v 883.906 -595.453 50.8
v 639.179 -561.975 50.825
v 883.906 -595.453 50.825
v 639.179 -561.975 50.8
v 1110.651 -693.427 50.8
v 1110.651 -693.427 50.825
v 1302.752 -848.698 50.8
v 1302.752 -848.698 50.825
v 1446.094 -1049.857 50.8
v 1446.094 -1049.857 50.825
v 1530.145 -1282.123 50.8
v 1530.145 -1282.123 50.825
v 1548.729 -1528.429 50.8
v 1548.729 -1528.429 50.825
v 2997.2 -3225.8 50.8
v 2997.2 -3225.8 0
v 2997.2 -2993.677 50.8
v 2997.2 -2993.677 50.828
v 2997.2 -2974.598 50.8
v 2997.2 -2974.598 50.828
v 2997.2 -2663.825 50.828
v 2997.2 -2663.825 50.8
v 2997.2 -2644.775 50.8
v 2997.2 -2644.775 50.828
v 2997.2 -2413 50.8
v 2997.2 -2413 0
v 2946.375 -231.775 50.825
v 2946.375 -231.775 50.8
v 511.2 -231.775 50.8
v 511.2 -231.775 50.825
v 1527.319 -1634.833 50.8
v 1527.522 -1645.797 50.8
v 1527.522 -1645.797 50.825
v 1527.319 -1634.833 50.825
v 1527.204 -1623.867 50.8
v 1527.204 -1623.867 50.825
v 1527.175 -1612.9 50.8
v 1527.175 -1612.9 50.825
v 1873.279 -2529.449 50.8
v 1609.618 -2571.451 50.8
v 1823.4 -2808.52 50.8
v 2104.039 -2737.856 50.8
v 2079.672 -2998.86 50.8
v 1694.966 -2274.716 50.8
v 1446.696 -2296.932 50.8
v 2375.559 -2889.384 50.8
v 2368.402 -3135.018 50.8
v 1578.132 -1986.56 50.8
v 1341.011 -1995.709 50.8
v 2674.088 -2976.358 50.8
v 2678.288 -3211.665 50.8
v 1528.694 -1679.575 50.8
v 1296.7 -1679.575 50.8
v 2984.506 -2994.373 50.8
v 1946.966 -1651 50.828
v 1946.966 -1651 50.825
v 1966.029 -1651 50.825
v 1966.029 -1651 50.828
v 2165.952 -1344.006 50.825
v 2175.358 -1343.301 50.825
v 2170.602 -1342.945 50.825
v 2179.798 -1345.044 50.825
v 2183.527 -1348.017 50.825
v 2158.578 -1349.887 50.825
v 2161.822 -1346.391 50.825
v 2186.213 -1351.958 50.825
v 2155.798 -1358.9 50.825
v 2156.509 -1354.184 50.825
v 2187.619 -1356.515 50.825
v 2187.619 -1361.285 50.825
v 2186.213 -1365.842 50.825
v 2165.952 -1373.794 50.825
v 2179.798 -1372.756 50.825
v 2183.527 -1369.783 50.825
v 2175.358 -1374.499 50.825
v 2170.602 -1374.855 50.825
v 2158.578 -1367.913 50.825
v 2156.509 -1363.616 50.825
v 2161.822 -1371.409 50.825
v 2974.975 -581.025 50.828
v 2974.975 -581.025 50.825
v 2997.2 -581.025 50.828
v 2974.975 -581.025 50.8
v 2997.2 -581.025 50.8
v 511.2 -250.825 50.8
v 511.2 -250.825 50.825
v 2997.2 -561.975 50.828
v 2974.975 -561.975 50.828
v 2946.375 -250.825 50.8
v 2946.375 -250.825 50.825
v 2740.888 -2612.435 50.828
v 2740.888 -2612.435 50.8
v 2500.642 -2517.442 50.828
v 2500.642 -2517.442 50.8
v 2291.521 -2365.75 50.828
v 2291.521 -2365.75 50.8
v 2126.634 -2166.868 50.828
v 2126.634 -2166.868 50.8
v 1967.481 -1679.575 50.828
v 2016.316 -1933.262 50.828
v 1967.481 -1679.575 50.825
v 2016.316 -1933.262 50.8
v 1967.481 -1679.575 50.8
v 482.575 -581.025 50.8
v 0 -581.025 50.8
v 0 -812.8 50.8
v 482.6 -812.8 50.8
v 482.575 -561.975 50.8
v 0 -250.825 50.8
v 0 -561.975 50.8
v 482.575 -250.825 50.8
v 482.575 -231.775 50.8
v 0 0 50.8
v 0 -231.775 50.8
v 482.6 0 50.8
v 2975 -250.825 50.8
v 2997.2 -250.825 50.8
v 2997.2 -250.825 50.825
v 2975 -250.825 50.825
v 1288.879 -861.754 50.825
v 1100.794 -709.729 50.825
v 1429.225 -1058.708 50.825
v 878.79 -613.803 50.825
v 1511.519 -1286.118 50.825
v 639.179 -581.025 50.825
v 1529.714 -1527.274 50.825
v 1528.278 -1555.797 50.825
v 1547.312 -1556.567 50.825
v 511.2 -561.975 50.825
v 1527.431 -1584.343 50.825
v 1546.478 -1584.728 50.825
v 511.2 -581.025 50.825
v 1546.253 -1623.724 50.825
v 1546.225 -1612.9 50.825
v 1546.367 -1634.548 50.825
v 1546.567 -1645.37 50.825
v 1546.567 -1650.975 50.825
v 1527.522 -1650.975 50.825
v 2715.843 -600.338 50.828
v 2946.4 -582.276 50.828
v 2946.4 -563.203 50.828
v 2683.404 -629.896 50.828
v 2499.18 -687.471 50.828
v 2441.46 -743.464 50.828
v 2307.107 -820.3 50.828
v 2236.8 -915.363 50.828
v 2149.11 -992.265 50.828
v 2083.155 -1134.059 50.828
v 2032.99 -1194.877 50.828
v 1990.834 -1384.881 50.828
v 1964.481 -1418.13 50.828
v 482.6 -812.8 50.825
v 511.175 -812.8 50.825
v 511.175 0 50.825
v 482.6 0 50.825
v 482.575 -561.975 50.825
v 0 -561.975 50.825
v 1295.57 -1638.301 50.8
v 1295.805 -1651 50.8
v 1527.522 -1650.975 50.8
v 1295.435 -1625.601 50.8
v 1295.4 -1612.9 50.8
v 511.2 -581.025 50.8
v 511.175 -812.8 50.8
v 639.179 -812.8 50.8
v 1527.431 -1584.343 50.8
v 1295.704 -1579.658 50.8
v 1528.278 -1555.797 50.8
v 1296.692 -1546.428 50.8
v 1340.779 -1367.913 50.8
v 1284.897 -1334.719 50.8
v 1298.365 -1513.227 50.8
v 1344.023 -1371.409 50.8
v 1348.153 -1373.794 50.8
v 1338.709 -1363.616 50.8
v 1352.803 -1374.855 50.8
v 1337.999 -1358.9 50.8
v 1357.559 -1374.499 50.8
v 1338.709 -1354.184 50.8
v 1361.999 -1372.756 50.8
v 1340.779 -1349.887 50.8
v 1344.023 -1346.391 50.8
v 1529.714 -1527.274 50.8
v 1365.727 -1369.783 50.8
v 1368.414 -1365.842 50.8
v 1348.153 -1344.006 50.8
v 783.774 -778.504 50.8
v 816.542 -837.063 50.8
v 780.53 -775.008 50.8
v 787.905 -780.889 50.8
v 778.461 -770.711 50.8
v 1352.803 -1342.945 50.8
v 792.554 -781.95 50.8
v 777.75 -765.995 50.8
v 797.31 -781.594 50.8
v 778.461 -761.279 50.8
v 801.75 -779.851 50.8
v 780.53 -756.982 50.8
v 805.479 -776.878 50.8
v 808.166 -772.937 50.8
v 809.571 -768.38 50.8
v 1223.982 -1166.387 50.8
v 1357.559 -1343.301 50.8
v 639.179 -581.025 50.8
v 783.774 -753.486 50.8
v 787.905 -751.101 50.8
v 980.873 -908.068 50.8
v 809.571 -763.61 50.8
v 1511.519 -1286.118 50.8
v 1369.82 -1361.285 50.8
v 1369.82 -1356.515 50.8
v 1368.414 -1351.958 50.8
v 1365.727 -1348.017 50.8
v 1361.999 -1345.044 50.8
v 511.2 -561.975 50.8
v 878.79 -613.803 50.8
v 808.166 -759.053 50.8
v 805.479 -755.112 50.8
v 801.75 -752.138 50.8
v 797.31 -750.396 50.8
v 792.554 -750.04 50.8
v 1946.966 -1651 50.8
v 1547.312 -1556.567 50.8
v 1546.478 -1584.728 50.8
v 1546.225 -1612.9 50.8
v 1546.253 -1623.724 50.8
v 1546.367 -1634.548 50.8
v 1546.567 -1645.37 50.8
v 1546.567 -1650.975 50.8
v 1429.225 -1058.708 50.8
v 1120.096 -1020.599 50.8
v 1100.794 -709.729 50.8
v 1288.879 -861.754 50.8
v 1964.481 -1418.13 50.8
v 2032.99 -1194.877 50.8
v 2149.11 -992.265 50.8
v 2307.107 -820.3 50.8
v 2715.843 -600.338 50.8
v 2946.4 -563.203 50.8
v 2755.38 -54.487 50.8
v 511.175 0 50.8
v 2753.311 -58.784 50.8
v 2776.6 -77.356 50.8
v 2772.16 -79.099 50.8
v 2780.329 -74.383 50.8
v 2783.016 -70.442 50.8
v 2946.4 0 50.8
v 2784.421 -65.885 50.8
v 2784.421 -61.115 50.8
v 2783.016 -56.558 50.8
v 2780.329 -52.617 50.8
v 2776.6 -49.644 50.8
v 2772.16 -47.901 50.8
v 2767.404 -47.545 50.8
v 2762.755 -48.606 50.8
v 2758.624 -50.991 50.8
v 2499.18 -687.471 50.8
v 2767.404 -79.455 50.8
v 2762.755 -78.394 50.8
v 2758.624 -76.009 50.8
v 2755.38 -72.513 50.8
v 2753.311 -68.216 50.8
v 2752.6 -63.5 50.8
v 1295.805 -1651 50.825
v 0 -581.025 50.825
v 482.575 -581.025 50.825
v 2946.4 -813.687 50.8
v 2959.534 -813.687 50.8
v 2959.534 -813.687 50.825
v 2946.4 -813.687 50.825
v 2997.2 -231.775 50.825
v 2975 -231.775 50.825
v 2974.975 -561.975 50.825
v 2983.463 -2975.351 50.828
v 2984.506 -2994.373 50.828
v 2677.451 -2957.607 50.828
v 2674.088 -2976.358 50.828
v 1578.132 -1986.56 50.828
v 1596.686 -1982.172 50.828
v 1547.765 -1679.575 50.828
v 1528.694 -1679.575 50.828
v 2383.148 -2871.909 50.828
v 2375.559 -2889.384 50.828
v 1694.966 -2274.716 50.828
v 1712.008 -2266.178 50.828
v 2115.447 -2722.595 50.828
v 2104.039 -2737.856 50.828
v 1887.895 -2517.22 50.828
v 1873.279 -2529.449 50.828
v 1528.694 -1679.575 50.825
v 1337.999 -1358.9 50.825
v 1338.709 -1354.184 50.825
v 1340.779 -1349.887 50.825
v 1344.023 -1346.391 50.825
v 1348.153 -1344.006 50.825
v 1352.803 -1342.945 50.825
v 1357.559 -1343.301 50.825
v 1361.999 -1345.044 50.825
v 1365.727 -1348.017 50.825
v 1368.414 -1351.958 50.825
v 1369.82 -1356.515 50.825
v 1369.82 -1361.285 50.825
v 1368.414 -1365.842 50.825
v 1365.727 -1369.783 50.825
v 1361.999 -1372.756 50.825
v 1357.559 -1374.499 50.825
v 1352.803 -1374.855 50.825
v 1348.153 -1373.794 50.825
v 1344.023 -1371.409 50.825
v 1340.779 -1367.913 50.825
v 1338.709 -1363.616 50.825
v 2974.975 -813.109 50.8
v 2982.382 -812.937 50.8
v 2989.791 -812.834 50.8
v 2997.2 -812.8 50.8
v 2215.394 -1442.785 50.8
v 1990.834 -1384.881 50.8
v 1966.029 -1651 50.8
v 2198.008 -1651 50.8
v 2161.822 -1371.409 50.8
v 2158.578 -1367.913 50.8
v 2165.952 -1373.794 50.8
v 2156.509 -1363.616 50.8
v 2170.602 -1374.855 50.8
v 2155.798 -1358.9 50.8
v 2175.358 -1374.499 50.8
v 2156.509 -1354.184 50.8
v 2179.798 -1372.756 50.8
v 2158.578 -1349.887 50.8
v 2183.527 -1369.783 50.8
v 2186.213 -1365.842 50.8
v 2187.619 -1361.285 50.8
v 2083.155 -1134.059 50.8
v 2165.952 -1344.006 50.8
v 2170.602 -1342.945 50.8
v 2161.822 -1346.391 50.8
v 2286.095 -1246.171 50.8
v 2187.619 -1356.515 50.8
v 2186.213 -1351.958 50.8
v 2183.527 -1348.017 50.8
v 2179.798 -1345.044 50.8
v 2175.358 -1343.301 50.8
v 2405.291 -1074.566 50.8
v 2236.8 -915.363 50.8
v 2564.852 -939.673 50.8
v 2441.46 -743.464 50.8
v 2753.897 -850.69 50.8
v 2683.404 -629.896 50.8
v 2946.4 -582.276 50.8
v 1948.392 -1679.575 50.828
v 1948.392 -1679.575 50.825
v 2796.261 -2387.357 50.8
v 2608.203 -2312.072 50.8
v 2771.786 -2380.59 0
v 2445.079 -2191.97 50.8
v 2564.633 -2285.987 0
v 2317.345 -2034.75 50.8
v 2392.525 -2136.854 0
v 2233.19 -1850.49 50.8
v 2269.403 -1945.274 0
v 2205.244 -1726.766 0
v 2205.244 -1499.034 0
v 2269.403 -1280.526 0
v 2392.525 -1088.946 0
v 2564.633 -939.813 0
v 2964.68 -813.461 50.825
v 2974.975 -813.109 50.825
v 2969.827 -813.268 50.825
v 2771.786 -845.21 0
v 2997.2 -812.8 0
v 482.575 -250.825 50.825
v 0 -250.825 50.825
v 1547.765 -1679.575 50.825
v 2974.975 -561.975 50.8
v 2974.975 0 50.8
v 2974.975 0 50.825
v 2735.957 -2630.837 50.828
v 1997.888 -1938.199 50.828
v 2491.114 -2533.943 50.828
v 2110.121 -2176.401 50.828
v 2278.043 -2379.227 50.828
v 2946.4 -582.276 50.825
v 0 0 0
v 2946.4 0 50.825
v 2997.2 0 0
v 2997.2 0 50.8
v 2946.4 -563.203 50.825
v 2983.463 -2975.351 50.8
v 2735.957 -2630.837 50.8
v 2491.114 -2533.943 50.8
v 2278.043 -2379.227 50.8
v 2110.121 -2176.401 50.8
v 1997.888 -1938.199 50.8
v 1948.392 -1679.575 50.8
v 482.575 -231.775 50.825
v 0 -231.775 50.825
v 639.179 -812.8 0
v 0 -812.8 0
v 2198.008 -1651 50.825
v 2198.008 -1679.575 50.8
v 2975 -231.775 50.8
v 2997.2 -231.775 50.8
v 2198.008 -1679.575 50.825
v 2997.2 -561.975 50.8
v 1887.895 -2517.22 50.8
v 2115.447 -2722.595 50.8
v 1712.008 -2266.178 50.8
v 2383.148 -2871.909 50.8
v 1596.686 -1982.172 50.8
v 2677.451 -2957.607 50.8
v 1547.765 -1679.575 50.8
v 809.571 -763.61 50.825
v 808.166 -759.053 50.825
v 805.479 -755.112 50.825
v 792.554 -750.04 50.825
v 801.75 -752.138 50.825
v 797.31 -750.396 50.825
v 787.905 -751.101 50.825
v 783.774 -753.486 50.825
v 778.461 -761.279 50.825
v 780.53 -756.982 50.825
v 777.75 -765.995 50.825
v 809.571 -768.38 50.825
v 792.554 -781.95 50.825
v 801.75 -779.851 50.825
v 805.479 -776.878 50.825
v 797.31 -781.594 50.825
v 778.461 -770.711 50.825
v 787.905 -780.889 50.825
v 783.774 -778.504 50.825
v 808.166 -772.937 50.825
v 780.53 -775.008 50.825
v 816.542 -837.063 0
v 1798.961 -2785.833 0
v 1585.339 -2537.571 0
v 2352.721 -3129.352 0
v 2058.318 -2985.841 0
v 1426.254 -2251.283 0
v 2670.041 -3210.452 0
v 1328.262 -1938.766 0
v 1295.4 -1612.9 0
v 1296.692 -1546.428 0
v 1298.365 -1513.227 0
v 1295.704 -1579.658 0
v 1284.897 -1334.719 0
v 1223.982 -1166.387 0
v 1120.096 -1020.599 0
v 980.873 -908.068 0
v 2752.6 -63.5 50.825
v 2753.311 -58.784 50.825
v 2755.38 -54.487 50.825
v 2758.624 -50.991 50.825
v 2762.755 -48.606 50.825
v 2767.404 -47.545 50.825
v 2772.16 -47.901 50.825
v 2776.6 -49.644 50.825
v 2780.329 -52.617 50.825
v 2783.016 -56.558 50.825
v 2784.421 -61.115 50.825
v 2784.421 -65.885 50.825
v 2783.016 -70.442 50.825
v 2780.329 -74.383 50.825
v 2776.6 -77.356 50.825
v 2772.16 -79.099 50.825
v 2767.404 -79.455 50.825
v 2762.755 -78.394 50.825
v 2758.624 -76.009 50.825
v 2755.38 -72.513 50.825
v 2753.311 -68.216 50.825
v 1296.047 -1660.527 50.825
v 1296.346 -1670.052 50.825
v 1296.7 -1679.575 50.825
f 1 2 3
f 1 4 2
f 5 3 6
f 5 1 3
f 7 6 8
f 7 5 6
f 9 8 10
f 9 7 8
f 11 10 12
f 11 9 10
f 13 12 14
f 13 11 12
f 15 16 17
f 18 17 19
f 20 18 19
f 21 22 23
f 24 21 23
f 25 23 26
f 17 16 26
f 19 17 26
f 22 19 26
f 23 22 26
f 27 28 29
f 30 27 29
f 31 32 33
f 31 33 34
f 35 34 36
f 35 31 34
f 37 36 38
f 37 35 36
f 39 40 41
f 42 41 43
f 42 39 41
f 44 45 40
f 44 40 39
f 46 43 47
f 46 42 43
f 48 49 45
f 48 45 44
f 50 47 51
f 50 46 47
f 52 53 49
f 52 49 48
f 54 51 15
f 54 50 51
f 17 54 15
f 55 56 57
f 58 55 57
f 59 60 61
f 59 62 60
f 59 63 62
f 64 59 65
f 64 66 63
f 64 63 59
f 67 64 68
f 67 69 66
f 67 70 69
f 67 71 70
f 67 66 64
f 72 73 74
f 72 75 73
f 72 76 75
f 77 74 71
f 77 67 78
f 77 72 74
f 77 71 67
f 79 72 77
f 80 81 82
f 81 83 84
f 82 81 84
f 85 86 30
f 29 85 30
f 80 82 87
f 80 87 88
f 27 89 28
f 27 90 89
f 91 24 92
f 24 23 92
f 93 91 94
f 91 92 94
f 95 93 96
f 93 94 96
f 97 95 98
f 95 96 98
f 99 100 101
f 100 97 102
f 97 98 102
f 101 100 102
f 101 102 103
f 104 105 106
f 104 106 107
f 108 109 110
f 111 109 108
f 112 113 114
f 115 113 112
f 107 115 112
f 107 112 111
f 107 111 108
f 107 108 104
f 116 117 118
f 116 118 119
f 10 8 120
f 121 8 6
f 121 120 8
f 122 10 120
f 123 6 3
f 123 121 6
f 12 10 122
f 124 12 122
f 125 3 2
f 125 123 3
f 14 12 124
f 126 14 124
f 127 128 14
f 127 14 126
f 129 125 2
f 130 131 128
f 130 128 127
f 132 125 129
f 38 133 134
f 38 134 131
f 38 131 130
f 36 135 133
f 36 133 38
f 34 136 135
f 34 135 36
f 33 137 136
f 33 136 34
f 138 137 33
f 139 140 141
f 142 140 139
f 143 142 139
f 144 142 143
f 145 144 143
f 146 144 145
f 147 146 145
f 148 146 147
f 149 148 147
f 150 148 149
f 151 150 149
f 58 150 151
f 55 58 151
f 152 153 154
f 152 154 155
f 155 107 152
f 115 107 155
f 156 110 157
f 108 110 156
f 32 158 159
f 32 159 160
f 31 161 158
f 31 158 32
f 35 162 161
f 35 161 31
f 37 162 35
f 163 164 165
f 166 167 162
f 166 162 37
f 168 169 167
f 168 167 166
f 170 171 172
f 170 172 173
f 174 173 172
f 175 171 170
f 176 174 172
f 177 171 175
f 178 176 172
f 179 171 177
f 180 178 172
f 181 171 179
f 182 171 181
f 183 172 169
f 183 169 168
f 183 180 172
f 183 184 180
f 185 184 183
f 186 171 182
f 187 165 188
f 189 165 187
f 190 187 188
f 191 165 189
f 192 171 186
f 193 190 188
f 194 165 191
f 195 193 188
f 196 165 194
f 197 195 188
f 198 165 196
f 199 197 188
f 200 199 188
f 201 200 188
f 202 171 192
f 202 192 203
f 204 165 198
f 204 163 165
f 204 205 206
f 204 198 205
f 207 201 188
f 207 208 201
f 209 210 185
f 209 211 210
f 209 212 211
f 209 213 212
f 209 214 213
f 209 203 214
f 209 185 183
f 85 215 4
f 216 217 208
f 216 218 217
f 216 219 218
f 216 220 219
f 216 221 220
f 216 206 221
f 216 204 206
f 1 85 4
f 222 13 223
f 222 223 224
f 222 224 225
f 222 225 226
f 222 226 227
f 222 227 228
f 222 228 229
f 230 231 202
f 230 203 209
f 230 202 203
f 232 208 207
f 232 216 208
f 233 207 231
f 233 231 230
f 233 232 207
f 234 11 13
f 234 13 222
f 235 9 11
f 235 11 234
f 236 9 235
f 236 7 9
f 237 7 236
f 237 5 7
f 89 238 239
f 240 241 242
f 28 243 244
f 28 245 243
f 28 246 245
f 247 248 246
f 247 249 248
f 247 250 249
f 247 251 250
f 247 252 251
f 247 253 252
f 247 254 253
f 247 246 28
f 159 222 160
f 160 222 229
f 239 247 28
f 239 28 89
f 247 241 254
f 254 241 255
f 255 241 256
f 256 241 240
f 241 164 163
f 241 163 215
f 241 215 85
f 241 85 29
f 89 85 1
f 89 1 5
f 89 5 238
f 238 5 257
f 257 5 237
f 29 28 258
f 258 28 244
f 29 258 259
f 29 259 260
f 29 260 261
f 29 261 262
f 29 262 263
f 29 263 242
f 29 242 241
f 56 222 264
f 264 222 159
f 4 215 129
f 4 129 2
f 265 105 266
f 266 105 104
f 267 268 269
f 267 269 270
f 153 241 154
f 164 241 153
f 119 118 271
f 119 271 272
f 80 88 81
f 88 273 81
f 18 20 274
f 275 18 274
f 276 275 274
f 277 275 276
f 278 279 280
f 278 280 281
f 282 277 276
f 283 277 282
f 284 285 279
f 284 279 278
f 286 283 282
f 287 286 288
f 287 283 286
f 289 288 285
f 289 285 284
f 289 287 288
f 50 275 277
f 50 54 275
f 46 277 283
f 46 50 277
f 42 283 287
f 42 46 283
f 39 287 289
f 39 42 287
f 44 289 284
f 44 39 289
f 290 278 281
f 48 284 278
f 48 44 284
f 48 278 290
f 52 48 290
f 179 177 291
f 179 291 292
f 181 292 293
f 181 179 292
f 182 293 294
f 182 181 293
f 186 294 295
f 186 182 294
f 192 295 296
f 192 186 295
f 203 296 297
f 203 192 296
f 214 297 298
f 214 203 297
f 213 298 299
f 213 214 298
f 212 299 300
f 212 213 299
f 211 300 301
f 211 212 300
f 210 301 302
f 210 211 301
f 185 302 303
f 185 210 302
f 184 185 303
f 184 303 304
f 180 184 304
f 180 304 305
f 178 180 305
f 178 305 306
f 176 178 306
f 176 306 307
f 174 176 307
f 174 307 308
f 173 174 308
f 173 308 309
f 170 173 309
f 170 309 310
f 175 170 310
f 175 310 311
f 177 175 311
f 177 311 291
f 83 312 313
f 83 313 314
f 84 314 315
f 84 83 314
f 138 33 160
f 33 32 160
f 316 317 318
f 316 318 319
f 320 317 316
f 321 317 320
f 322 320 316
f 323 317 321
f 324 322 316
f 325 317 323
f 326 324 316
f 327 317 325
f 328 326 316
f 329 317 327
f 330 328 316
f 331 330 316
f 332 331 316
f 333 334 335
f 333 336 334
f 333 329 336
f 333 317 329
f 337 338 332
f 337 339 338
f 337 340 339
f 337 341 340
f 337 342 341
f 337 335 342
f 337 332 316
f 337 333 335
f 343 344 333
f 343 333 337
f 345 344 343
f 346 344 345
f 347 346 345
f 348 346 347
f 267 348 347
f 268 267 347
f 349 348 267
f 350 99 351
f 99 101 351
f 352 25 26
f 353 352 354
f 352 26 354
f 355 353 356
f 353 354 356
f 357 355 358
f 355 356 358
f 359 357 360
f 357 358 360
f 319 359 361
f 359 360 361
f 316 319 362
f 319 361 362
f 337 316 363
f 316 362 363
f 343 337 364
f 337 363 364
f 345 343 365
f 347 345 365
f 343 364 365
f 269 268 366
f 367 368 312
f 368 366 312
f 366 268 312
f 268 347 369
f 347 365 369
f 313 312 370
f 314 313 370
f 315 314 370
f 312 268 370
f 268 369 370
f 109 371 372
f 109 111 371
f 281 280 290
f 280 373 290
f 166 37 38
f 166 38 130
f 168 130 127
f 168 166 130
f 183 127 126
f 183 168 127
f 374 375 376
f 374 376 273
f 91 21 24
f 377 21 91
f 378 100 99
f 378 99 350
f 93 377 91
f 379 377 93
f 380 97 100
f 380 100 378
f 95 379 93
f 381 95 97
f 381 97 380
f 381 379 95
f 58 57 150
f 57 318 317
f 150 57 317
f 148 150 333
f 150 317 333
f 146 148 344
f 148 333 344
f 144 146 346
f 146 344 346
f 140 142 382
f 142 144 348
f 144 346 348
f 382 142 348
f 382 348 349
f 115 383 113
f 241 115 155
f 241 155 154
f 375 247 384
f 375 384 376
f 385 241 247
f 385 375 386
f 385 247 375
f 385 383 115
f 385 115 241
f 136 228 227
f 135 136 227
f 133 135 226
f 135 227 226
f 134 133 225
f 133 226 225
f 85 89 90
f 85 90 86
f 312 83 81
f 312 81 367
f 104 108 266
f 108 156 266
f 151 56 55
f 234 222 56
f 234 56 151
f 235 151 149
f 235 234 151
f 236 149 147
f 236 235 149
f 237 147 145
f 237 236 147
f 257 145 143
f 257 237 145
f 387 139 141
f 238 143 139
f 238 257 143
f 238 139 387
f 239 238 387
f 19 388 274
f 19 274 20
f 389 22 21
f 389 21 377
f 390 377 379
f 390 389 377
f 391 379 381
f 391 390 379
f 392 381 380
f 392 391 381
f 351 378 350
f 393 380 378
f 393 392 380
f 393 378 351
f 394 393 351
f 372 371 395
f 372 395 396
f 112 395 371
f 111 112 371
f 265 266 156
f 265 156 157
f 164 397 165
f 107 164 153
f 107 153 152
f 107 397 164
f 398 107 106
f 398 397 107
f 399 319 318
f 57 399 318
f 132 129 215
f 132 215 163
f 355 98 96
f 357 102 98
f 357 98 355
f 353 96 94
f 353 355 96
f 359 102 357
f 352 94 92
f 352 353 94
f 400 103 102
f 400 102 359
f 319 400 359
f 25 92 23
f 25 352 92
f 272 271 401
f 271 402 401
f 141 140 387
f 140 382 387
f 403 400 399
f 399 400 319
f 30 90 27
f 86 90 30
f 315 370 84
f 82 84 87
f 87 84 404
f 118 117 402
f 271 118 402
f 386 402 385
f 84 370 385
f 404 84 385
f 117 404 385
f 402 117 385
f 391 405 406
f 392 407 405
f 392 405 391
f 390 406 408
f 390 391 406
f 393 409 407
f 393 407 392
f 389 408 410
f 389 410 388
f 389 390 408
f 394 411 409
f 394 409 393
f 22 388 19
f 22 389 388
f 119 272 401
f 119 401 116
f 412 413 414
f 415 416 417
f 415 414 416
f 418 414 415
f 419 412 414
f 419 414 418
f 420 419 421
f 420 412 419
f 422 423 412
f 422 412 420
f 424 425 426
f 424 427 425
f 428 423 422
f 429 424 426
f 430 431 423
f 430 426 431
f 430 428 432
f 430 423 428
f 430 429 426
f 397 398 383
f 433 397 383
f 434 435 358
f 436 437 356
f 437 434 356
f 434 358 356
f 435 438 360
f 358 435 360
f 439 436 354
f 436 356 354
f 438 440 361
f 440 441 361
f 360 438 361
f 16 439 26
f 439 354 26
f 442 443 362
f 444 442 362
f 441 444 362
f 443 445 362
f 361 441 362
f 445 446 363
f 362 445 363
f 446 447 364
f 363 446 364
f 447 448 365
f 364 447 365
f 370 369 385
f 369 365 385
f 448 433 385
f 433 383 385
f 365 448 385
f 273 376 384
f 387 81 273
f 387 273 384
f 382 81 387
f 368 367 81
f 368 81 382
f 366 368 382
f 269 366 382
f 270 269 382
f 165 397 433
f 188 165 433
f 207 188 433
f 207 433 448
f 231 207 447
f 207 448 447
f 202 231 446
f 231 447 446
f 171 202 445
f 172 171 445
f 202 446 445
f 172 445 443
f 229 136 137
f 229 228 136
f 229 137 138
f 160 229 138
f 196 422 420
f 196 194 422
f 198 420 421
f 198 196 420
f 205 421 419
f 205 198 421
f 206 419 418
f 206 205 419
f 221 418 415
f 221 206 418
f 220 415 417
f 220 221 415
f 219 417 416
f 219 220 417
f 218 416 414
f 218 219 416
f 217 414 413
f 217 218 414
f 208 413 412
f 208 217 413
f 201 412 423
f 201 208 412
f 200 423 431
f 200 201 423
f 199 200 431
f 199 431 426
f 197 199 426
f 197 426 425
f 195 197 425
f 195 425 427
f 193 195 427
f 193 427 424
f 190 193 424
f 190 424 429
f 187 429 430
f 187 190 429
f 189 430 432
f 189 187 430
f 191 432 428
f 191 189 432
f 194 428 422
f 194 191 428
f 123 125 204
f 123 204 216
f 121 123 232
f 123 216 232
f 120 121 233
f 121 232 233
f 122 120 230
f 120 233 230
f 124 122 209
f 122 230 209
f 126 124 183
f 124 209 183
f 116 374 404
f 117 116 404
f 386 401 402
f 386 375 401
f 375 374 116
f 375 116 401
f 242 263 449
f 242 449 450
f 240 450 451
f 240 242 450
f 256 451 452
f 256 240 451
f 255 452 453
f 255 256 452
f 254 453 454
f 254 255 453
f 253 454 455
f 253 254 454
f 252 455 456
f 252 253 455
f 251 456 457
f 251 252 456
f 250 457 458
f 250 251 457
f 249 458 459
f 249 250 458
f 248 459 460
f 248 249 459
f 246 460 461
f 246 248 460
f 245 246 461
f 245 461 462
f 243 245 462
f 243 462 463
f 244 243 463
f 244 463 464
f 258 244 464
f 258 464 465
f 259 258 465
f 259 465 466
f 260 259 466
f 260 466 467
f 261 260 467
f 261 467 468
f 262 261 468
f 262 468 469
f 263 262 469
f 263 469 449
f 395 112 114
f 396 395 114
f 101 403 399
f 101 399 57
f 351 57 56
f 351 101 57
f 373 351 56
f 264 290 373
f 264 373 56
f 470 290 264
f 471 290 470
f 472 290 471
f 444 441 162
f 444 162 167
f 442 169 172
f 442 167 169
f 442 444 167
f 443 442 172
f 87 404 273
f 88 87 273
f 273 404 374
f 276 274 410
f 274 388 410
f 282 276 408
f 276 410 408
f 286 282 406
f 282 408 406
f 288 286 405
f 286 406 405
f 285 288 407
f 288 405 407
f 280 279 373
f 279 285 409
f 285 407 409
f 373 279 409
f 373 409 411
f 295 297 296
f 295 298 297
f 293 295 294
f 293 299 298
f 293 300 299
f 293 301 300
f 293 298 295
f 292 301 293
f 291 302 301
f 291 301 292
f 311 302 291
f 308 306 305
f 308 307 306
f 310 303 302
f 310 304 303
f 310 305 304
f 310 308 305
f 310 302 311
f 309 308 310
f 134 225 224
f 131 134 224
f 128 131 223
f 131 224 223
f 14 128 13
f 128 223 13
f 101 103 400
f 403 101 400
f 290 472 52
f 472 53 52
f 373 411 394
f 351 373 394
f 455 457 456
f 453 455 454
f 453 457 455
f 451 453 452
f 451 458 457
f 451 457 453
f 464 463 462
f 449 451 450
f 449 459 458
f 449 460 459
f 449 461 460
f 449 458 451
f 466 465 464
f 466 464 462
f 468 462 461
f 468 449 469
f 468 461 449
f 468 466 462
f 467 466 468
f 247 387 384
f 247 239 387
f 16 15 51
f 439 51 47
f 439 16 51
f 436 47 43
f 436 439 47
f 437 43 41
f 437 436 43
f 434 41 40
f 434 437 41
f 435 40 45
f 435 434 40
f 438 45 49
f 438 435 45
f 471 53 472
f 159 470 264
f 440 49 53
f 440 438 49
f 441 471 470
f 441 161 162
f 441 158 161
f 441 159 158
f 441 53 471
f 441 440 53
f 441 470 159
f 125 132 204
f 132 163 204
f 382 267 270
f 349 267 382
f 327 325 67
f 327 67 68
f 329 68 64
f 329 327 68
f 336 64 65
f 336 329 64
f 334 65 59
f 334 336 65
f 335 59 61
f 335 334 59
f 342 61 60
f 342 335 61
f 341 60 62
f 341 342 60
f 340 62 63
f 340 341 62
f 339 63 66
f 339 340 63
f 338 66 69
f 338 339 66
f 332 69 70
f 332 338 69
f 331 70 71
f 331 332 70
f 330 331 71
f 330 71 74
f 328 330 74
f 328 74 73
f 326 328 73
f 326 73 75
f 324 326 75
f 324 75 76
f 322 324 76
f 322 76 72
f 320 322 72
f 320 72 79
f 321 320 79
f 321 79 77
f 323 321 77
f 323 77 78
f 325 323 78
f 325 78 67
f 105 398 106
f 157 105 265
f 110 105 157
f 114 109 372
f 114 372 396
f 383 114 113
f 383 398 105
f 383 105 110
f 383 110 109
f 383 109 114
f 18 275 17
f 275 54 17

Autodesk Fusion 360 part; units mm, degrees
sketch "Sketch1" plane through (0, 0, 0) normal (0, 0, 1) x (1, 0, 0)
  line L0 (0, 0) -> (609.6, 0)
  line L1 (609.6, -812.8) -> (0, -812.8)
  line L2 (0, -812.8) -> (0, 0)
  line L3 (0, 0) -> (3022.6, 0)
  line L4 (3022.6, 0) -> (0, 0)
  line L5 (0, 0) -> (0, -812.8)
  line L6 (0, -812.8) -> (3022.6, -812.8)
  line L7 (0, 0) -> (1320.8, 0)
  circle A0 centre (4656.6619, -4772.6092) radius 793.75
  circle A1 centre (4656.6619, -4772.6092) radius 1625.6
  circle A2 centre (2997.2, -1612.9) radius 1612.9
  circle A3 centre (2997.2, -1612.9) radius 800.1
  line L8 (2997.2, -1612.9) -> (2997.2, 0)
  line L9 (2997.2, -1612.9) -> (2997.2, -3225.8)
  line L10 (3022.6, 0) -> (2997.2, 0)
  line L11 (2997.2, 0) -> (2997.2, -812.8)
  line L12 (2997.2, -812.8) -> (3022.6, -812.8)
  line L13 (2997.2, -1612.9) -> (1295.4, -1612.9)
  arc A4 (1384.3, -1612.9) -> (2997.2, -3225.8) centre (2997.2, -1612.9) ccw
  arc A5 (1384.3, -1612.9) -> (2997.2, -3225.8) centre (2997.2, -1612.9) ccw
  line L14 (2997.2, -1612.9) -> (1806.0752, -2792.535)
  arc A6 (1295.4, -1612.9) -> (2997.2, -3225.8) centre (2908.8371, -1614.7833) ccw
  arc A7 (2997.2, 0) -> (1295.4, -1612.9) centre (2908.8371, -1611.0167) ccw
  circle A8 centre (639.1793, -1473.2) radius 660.4
  dimension "d1" = 609.6
  dimension "d2" = 812.8
  dimension "d4" = 3022.6
  dimension "d8" = 1320.8
  dimension "d10" = 1587.5
  dimension "d11" = 3251.2
  dimension "d14" = 25.4
  dimension "d15" = 1701.8
  dimension "d16" = 1676.4
  dimension "d18" = 1320.8
extrude "Extrude1" add sketch "Sketch1" along normal blind 50.8 contours L0 L1 L2 L3 L4 L5 L6 L7 A7 | L3 L4 L6 A2 A7 | L6 A7 A8 | L6 A2 L8 L11 | L6 A2 L13 A7 | L6 A2 A3 L13 | A2 L13 A4 A5 L14 A6 | A2 A4 A5 L14 A6 | A2 A3 L9 A4 A5 L14 | A2 A3 L13 A4 A5 L14
sketch "Lines" plane through (0, 0, 50.8) normal (0, 0, 1) x (-1, 0, 0)
  arc A0 (-1295.4, 1612.9) -> (-2997.2, 3225.8) centre (-2908.8371, 1614.7833) ccw
  line L0 (-2997.2, 3225.8) -> (-2997.2, 2413)
  arc A1 (-2997.2, 812.8) -> (-2997.2, 2413) centre (-2997.2, 1612.9) ccw
  line L1 (-2997.2, 812.8) -> (-2997.2, 0)
  line L2 (-2997.2, 0) -> (0, 0)
  line L3 (0, 0) -> (0, 812.8)
  line L4 (0, 812.8) -> (-639.1793, 812.8)
  arc A2 (-1298.3651, 1513.2267) -> (-639.1793, 812.8) centre (-639.1793, 1473.2) ccw
  arc A3 (-1298.3651, 1513.2267) -> (-1295.4, 1612.9) centre (-2908.8371, 1611.0167) ccw
  line L5 (0, 431.8) -> (-482.6, 431.8)
  line L6 (-482.6, 431.8) -> (-511.175, 431.8)
  line L7 (-511.175, 431.8) -> (-511.175, 812.8)
  line L8 (-511.175, 812.8) -> (-482.6, 812.8)
  line L9 (-482.6, 812.8) -> (-482.6, 431.8)
  line L10 (-511.175, 812.8) -> (-482.6, 812.8)
  line L11 (-482.6, 812.8) -> (-482.6, 0)
  line L12 (-482.6, 0) -> (-511.175, 0)
  line L13 (-511.175, 0) -> (-511.175, 812.8)
  line L14 (-1651, 0) -> (-1651, 1651)
  line L15 (-1651, 1651) -> (-1291.2162, 1651)
  line L16 (-1291.2162, 1651) -> (-1291.2162, 1679.575)
  line L17 (-1291.2162, 1679.575) -> (-1651, 1679.575)
  line L18 (-1651, 1679.575) -> (-1651, 1651)
  line L19 (-1291.2162, 1679.575) -> (-2198.0077, 1679.575)
  line L20 (-2198.0077, 1679.575) -> (-2198.0077, 1651)
  line L21 (-2198.0077, 1651) -> (-1291.2162, 1651)
  line L22 (-1291.2162, 1651) -> (-1291.2162, 1679.575)
  line L23 (0, 431.8) -> (-2946.4, 431.8)
  line L24 (-2946.4, 431.8) -> (-2974.975, 431.8)
  line L25 (-2974.975, 431.8) -> (-2974.975, 813.6871)
  line L26 (-2974.975, 813.6871) -> (-2946.4, 813.6871)
  line L27 (-2946.4, 813.6871) -> (-2946.4, 431.8)
  line L28 (-2974.975, 431.8) -> (-2946.4, 431.8)
  line L29 (-2946.4, 431.8) -> (-2946.4, 0)
  line L30 (-2946.4, 0) -> (-2974.975, 0)
  line L31 (-2974.975, 0) -> (-2974.975, 431.8)
  dimension "d45" = 482.6
  dimension "d46" = 28.575
  dimension "d47" = 1651
  dimension "d48" = 28.575
  dimension "d49" = 2946.4
  dimension "d50" = 28.575
extrude "Extrude6" add sketch "Lines" along normal blind 0.0254 contours A0 L15 L17 L18 L19 L21 | L18 L19 L20 L21 | L4 L6 L7 L8 L9 L10 L11 L13 L23 | L2 L6 L11 L12 L13 L23 | L2 L24 L28 L29 L30 L31 | A1 L24 L25 L26 L27 L28
sketch "Sketch7" plane through (0, 0, 50.8) normal (0, 0, 1) x (-1, 0, 0)
  line L0 (-2959.5333, 813.6871) -> (-2946.4, 813.6871)
  line L1 (-2946.4, 813.6871) -> (-2946.4, 0)
  line L2 (-2946.4, 0) -> (-511.175, 0)
  line L3 (-511.175, 0) -> (-511.175, 812.8)
  line L4 (-511.175, 812.8) -> (-639.1793, 812.8)
  arc A0 (-1298.3651, 1513.2267) -> (-639.1793, 812.8) centre (-639.1793, 1473.2) ccw
  arc A1 (-1298.3651, 1513.2267) -> (-1295.4, 1612.9) centre (-2908.8371, 1611.0167) ccw
  arc A2 (-1295.4, 1612.9) -> (-1295.8054, 1651) centre (-2908.8371, 1614.7833) ccw
  line L5 (-1295.8054, 1651) -> (-2198.0077, 1651)
  arc A3 (-2959.5333, 813.6871) -> (-2198.0077, 1651) centre (-2997.2, 1612.9) ccw
  line L6 (-482.6, 812.8) -> (-482.6, 0)
  line L7 (-482.6, 0) -> (0, 0)
  line L8 (0, 0) -> (0, 812.8)
  line L9 (0, 812.8) -> (-482.6, 812.8)
  line L10 (-2198.0077, 1679.575) -> (-1296.7004, 1679.575)
  arc A4 (-1296.7004, 1679.575) -> (-2997.2, 3225.8) centre (-2908.8371, 1614.7833) ccw
  line L11 (-2997.2, 3225.8) -> (-2997.2, 2413)
  arc A5 (-2198.0077, 1651) -> (-2997.2, 2413) centre (-2997.2, 1612.9) ccw
  line L12 (-2198.0077, 1651) -> (-2198.0077, 1679.575)
  line L13 (-2997.2, 812.8) -> (-2997.2, 0)
  line L14 (-574.675, 749.3) -> (-639.1793, 749.3)
  arc A6 (-1361.7484, 1517.0754) -> (-639.1793, 749.3) centre (-639.1793, 1473.2) ccw
  arc A7 (-1361.7484, 1517.0754) -> (-1359.0773, 1587.5) centre (-2908.8371, 1611.0167) ccw
  line L15 (-1359.0773, 1587.5) -> (-2133.9736, 1587.5)
  arc A8 (-2882.9, 756.8974) -> (-2133.9736, 1587.5) centre (-2997.2, 1612.9) ccw
  line L16 (-2882.9, 756.8974) -> (-2882.9, 63.5)
  line L17 (-2882.9, 63.5) -> (-574.675, 63.5)
  line L18 (-574.675, 63.5) -> (-574.675, 749.3)
  circle A9 centre (-793.75, 765.9949) radius 16
  circle A10 centre (-2171.7977, 1358.9) radius 16
  circle A11 centre (-1353.9986, 1358.9) radius 16
  circle A12 centre (-2768.6, 63.5) radius 16
  dimension "d53" = 63.5
  dimension "d55" = 32
  dimension "d59" = 32
  dimension "d60" = 32
  dimension "d62" = 32
extrude "Extrude7" add sketch "Sketch7" along normal blind 0.0254 contours A6 A9 | A6 A9 | L17 A12 | L17 A12 | A6 A11 | A6 A11 | A8 A10 | A8 A10
sketch "Sketch8" plane through (0, 0, 50.8) normal (0, 0, 1) x (-1, 0, 0)
  line L0 (-482.6, 812.8) -> (-482.6, 0)
  line L1 (-482.6, 0) -> (0, 0)
  line L2 (0, 0) -> (0, 812.8)
  line L3 (0, 812.8) -> (-482.6, 812.8)
  line L4 (-482.6, 231.775) -> (0, 231.775)
  line L5 (-482.6, 250.825) -> (0, 250.825)
  line L6 (0, 561.975) -> (-482.6, 561.975)
  line L7 (0, 581.025) -> (-482.6, 581.025)
  dimension "d66" = -250.825
extrude "Extrude8" add sketch "Sketch8" along normal blind 0.0254 contours L0 L2 L6 L7 | L0 L2 L4 L5
sketch "Sketch9" plane through (0, 0, 50.8254) normal (0, 0, 1) x (-1, 0, 0)
  line L0 (-511.175, 0) -> (-482.6, 0)
  line L1 (-482.6, 0) -> (-482.6, 231.775)
  line L2 (-482.6, 231.775) -> (0, 231.775)
  line L3 (0, 231.775) -> (0, 250.825)
  line L4 (0, 250.825) -> (-482.6, 250.825)
  line L5 (-482.6, 250.825) -> (-482.6, 561.975)
  line L6 (-482.6, 561.975) -> (0, 561.975)
  line L7 (0, 561.975) -> (0, 581.025)
  line L8 (0, 581.025) -> (-482.6, 581.025)
  line L9 (-482.6, 581.025) -> (-482.6, 812.8)
  line L10 (-482.6, 812.8) -> (-511.175, 812.8)
  line L11 (-511.175, 812.8) -> (-511.175, 0)
  line L12 (-482.6, 231.775) -> (-482.5746, 231.775)
  line L13 (-482.5746, 231.775) -> (-482.5746, 250.825)
  line L14 (-482.5746, 250.825) -> (-482.6, 250.825)
  line L15 (-482.6, 250.825) -> (-482.6, 231.775)
  dimension "d71" = 0.0254
extrude "Extrude9" cut sketch "Sketch9" against normal blind 0.0254 contours L2 L4 L12 L13 L14 L15
sketch "Sketch10" plane through (0, 0, 50.8) normal (0, 0, 1) x (-1, 0, 0)
  line L0 (-482.6, 581.025) -> (0, 581.025)
  line L1 (0, 581.025) -> (0, 812.8)
  line L2 (0, 812.8) -> (-482.6, 812.8)
  line L3 (-482.6, 812.8) -> (-482.6, 581.025)
sketch "Sketch11" plane through (0, 0, 50.8254) normal (0, 0, 1) x (-1, 0, 0)
  line L0 (-482.6, 0) -> (-482.6, 561.975)
  line L1 (-482.6, 561.975) -> (0, 561.975)
  line L2 (0, 561.975) -> (0, 581.025)
  line L3 (0, 581.025) -> (-482.6, 581.025)
  line L4 (-482.6, 581.025) -> (-482.6, 812.8)
  line L5 (-482.6, 812.8) -> (-511.175, 812.8)
  line L6 (-511.175, 812.8) -> (-511.175, 0)
  line L7 (-511.175, 0) -> (-482.6, 0)
  line L8 (-482.6, 561.975) -> (-482.5746, 561.975)
  line L9 (-482.5746, 561.975) -> (-482.5746, 581.025)
  line L10 (-482.5746, 581.025) -> (-482.6, 581.025)
  line L11 (-482.6, 581.025) -> (-482.6, 561.975)
  dimension "d74" = 0.0254
extrude "Extrude10" cut sketch "Sketch11" against normal blind 0.0254 contours L1 L3 L8 L9 L10 L11
sketch "Sketch12" plane through (0, 0, 50.8) normal (0, 0, 1) x (-1, 0, 0)
  circle A0 centre (-2768.6, 63.5) radius 16
  circle A1 centre (-793.75, 765.9949) radius 16
  circle A2 centre (-2171.7977, 1358.9) radius 16
  circle A3 centre (-1353.9986, 1358.9) radius 16
  line L0 (-2959.5333, 813.6871) -> (-2946.4, 813.6871)
  line L1 (-2946.4, 813.6871) -> (-2946.4, 0)
  line L2 (-2946.4, 0) -> (-511.175, 0)
  line L3 (-511.175, 0) -> (-511.175, 812.8)
  line L4 (-511.175, 812.8) -> (-639.1793, 812.8)
  arc A4 (-1298.3651, 1513.2267) -> (-639.1793, 812.8) centre (-639.1793, 1473.2) ccw
  arc A5 (-1298.3651, 1513.2267) -> (-1295.4, 1612.9) centre (-2908.8371, 1611.0167) ccw
  arc A6 (-1295.4, 1612.9) -> (-1295.8054, 1651) centre (-2908.8371, 1614.7833) ccw
  line L5 (-1295.8054, 1651) -> (-2198.0077, 1651)
  arc A7 (-2959.5333, 813.6871) -> (-2198.0077, 1651) centre (-2997.2, 1612.9) ccw
  line L6 (-2946.4, 250.825) -> (-511.175, 250.825)
  line L7 (-2946.4, 231.775) -> (-511.175, 231.775)
  dimension "d78" = -231.775
extrude "Extrude11" add sketch "Sketch12" along normal blind 0.0254 contours L1 L3 L6 L7
sketch "Sketch13" plane through (0, 0, 50.8254) normal (0, 0, 1) x (-1, 0, 0)
  line L0 (-482.6, 0) -> (-482.6, 812.8)
  line L1 (-482.6, 812.8) -> (-511.175, 812.8)
  line L2 (-511.175, 812.8) -> (-511.175, 250.825)
  line L3 (-511.175, 250.825) -> (-2946.4, 250.825)
  line L4 (-2946.4, 250.825) -> (-2946.4, 813.6871)
  line L5 (-2946.4, 813.6871) -> (-2959.5333, 813.6871)
  arc A0 (-2974.975, 813.1087) -> (-2959.5333, 813.6871) centre (-2997.2, 1612.9) ccw
  line L6 (-2974.975, 813.1087) -> (-2974.975, 0)
  line L7 (-2974.975, 0) -> (-2946.4, 0)
  line L8 (-2946.4, 0) -> (-2946.4, 231.775)
  line L9 (-2946.4, 231.775) -> (-511.175, 231.775)
  line L10 (-511.175, 231.775) -> (-511.175, 0)
  line L11 (-511.175, 0) -> (-482.6, 0)
  line L12 (-511.175, 250.825) -> (-511.2004, 250.825)
  line L13 (-511.2004, 250.825) -> (-511.2004, 231.775)
  line L14 (-511.2004, 231.775) -> (-511.175, 231.775)
  line L15 (-511.175, 231.775) -> (-511.175, 250.825)
  dimension "d81" = 0.0254
extrude "Extrude12" cut sketch "Sketch13" against normal blind 0.0254 contours L3 L9 L12 L13 L14 L15
sketch "Sketch14" plane through (0, 0, 50.8254) normal (0, 0, 1) x (-1, 0, 0)
  line L0 (-511.2004, 231.775) -> (-511.2004, 250.825)
  line L1 (-511.2004, 250.825) -> (-2946.4, 250.825)
  line L2 (-2946.4, 250.825) -> (-2946.4, 813.6871)
  line L3 (-2946.4, 813.6871) -> (-2959.5333, 813.6871)
  arc A0 (-2974.975, 813.1087) -> (-2959.5333, 813.6871) centre (-2997.2, 1612.9) ccw
  line L4 (-2974.975, 813.1087) -> (-2974.975, 0)
  line L5 (-2974.975, 0) -> (-2946.4, 0)
  line L6 (-2946.4, 0) -> (-2946.4, 231.775)
  line L7 (-2946.4, 231.775) -> (-511.2004, 231.775)
  line L8 (-2946.4, 250.825) -> (-2946.3746, 250.825)
  line L9 (-2946.3746, 250.825) -> (-2946.3746, 231.775)
  line L10 (-2946.3746, 231.775) -> (-2946.4, 231.775)
  line L11 (-2946.4, 231.775) -> (-2946.4, 250.825)
  dimension "d84" = 0.0254
extrude "Extrude13" cut sketch "Sketch14" against normal blind 0.0254 contours L1 L7 L8 L9 L10 L11
sketch "Sketch15" plane through (0, 0, 50.8) normal (0, 0, 1) x (-1, 0, 0)
  line L0 (-2974.975, 0) -> (-2974.975, 813.1087)
  arc A0 (-2997.2, 812.8) -> (-2974.975, 813.1087) centre (-2997.2, 1612.9) ccw
  line L1 (-2997.2, 812.8) -> (-2997.2, 0)
  line L2 (-2997.2, 0) -> (-2974.975, 0)
  line L3 (-2997.2, 231.775) -> (-2974.975, 231.775)
  line L4 (-2997.2, 250.825) -> (-2974.975, 250.825)
extrude "Extrude14" add sketch "Sketch15" along normal blind 0.0254 contours L0 L1 L3 L4
sketch "Sketch16" plane through (0, 0, 50.8254) normal (0, 0, 1) x (-1, 0, 0)
  line L0 (-2946.4, 0) -> (-2946.4, 813.6871)
  line L1 (-2946.4, 813.6871) -> (-2959.5333, 813.6871)
  arc A0 (-2974.975, 813.1087) -> (-2959.5333, 813.6871) centre (-2997.2, 1612.9) ccw
  line L2 (-2974.975, 813.1087) -> (-2974.975, 250.825)
  line L3 (-2974.975, 250.825) -> (-2997.2, 250.825)
  line L4 (-2997.2, 250.825) -> (-2997.2, 231.775)
  line L5 (-2997.2, 231.775) -> (-2974.975, 231.775)
  line L6 (-2974.975, 231.775) -> (-2974.975, 0)
  line L7 (-2974.975, 0) -> (-2946.4, 0)
  line L8 (-2974.975, 231.775) -> (-2975.0004, 231.775)
  line L9 (-2975.0004, 231.775) -> (-2975.0004, 250.825)
  line L10 (-2975.0004, 250.825) -> (-2974.975, 250.825)
  line L11 (-2974.975, 250.825) -> (-2974.975, 231.775)
  dimension "d93" = 0.0254
extrude "Extrude15" cut sketch "Sketch16" against normal blind 0.0254 contours L3 L5 L8 L9 L10 L11
sketch "Sketch17" plane through (0, 0, 50.8) normal (0, 0, 1) x (-1, 0, 0)
  line L0 (-2975.0004, 231.775) -> (-2997.2, 231.775)
  line L1 (-2997.2, 231.775) -> (-2997.2, 0)
  line L2 (-2997.2, 0) -> (-2974.975, 0)
  line L3 (-2974.975, 0) -> (-2974.975, 813.1087)
  arc A0 (-2997.2, 812.8) -> (-2974.975, 813.1087) centre (-2997.2, 1612.9) ccw
  line L4 (-2997.2, 812.8) -> (-2997.2, 250.825)
  line L5 (-2997.2, 250.825) -> (-2975.0004, 250.825)
  line L6 (-2975.0004, 250.825) -> (-2975.0004, 231.775)
sketch "Sketch18" plane through (0, 0, 50.8) normal (0, 0, 1) x (-1, 0, 0)
  line L0 (-2946.3746, 250.825) -> (-511.2004, 250.825)
  line L1 (-511.2004, 250.825) -> (-511.2004, 231.775)
  line L2 (-511.2004, 231.775) -> (-2946.3746, 231.775)
  line L3 (-2946.3746, 231.775) -> (-2946.3746, 250.825)
  circle A0 centre (-2768.6, 63.5) radius 16
  line L4 (-2946.4, 813.6871) -> (-2946.4, 0)
  line L5 (-2946.4, 0) -> (-511.175, 0)
  line L6 (-511.175, 0) -> (-511.175, 812.8)
  line L7 (-511.175, 812.8) -> (-639.1793, 812.8)
  arc A1 (-1298.3651, 1513.2267) -> (-639.1793, 812.8) centre (-639.1793, 1473.2) ccw
  arc A2 (-1298.3651, 1513.2267) -> (-1295.4, 1612.9) centre (-2908.8371, 1611.0167) ccw
  arc A3 (-1295.4, 1612.9) -> (-1295.8054, 1651) centre (-2908.8371, 1614.7833) ccw
  line L8 (-1295.8054, 1651) -> (-2198.0077, 1651)
  arc A4 (-2959.5333, 813.6871) -> (-2198.0077, 1651) centre (-2997.2, 1612.9) ccw
  line L9 (-2959.5333, 813.6871) -> (-2946.4, 813.6871)
  circle A5 centre (-793.75, 765.9949) radius 16
  circle A6 centre (-2171.7977, 1358.9) radius 16
  circle A7 centre (-1353.9986, 1358.9) radius 16
  arc A8 (-1548.729, 1528.4291) -> (-639.1793, 561.975) centre (-639.1793, 1473.2) ccw
  line L10 (-511.175, 561.975) -> (-639.1793, 561.975)
  arc A9 (-1529.714, 1527.2745) -> (-639.1793, 581.025) centre (-639.1793, 1473.2) ccw
  line L11 (-511.175, 581.025) -> (-639.1793, 581.025)
  arc A10 (-1529.714, 1527.2745) -> (-1527.1752, 1612.9) centre (-2908.8371, 1611.0167) ccw
  arc A11 (-1527.1752, 1612.9) -> (-1527.522, 1645.7974) centre (-2908.8371, 1614.7833) ccw
  arc A12 (-1548.729, 1528.4291) -> (-1546.2252, 1612.9) centre (-2908.8371, 1611.0167) ccw
  arc A13 (-1546.2252, 1612.9) -> (-1546.5672, 1645.3698) centre (-2908.8371, 1614.7833) ccw
  line L12 (-1527.522, 1645.7974) -> (-1527.522, 1651)
  line L13 (-1546.5672, 1645.3698) -> (-1546.5672, 1651)
  line L14 (-1527.522, 1651) -> (-1546.5672, 1651)
  dimension "d96" = -250.825
  dimension "d97" = -231.775
  dimension "d99" = -250.825
extrude "Extrude16" add sketch "Sketch18" along normal blind 0.0254 contours L6 L8 A8 L10 A9 L11 A10 A11 A12 A13 L12 L13 L14
sketch "Sketch19" plane through (0, 0, 50.8254) normal (0, 0, 1) x (-1, 0, 0)
  line L0 (-2198.0077, 1651) -> (-1546.5672, 1651)
  line L1 (-1546.5672, 1651) -> (-1546.5672, 1645.3698)
  arc A0 (-1546.2252, 1612.9) -> (-1546.5672, 1645.3698) centre (-2908.8371, 1614.7833) ccw
  arc A1 (-1548.729, 1528.4291) -> (-1546.2252, 1612.9) centre (-2908.8371, 1611.0167) ccw
  arc A2 (-1548.729, 1528.4291) -> (-639.1793, 561.975) centre (-639.1793, 1473.2) ccw
  line L2 (-639.1793, 561.975) -> (-511.175, 561.975)
  line L3 (-511.175, 561.975) -> (-511.175, 0)
  line L4 (-511.175, 0) -> (-482.6, 0)
  line L5 (-482.6, 0) -> (-482.6, 812.8)
  line L6 (-482.6, 812.8) -> (-511.175, 812.8)
  line L7 (-511.175, 812.8) -> (-511.175, 581.025)
  line L8 (-511.175, 581.025) -> (-639.1793, 581.025)
  arc A3 (-1529.714, 1527.2745) -> (-639.1793, 581.025) centre (-639.1793, 1473.2) ccw
  arc A4 (-1529.714, 1527.2745) -> (-1527.1752, 1612.9) centre (-2908.8371, 1611.0167) ccw
  arc A5 (-1527.1752, 1612.9) -> (-1527.522, 1645.7974) centre (-2908.8371, 1614.7833) ccw
  line L9 (-1527.522, 1645.7974) -> (-1527.522, 1651)
  line L10 (-1527.522, 1651) -> (-1295.8054, 1651)
  arc A6 (-1295.8054, 1651) -> (-1296.7004, 1679.575) centre (-2908.8371, 1614.7833) ccw
  line L11 (-1296.7004, 1679.575) -> (-2198.0077, 1679.575)
  line L12 (-2198.0077, 1679.575) -> (-2198.0077, 1651)
  line L13 (-511.175, 561.975) -> (-511.2004, 561.975)
  line L14 (-511.2004, 561.975) -> (-511.2004, 581.025)
  line L15 (-511.2004, 581.025) -> (-511.175, 581.025)
  line L16 (-511.175, 581.025) -> (-511.175, 561.975)
  dimension "d102" = 0.0254
extrude "Extrude17" cut sketch "Sketch19" against normal blind 0.0254 contours L2 L8 L13 L14 L15 L16
sketch "Sketch20" plane through (0, 0, 50.8254) normal (0, 0, 1) x (-1, 0, 0)
  line L0 (-511.2004, 561.975) -> (-511.2004, 581.025)
  line L1 (-511.2004, 581.025) -> (-639.1793, 581.025)
  arc A0 (-1529.714, 1527.2745) -> (-639.1793, 581.025) centre (-639.1793, 1473.2) ccw
  arc A1 (-1529.714, 1527.2745) -> (-1527.1752, 1612.9) centre (-2908.8371, 1611.0167) ccw
  arc A2 (-1527.1752, 1612.9) -> (-1527.522, 1645.7974) centre (-2908.8371, 1614.7833) ccw
  line L2 (-1527.522, 1645.7974) -> (-1527.522, 1651)
  line L3 (-1527.522, 1651) -> (-1295.8054, 1651)
  arc A3 (-1295.8054, 1651) -> (-1296.7004, 1679.575) centre (-2908.8371, 1614.7833) ccw
  line L4 (-1296.7004, 1679.575) -> (-2198.0077, 1679.575)
  line L5 (-2198.0077, 1679.575) -> (-2198.0077, 1651)
  line L6 (-2198.0077, 1651) -> (-1546.5672, 1651)
  line L7 (-1546.5672, 1651) -> (-1546.5672, 1645.3698)
  arc A4 (-1546.2252, 1612.9) -> (-1546.5672, 1645.3698) centre (-2908.8371, 1614.7833) ccw
  arc A5 (-1548.729, 1528.4291) -> (-1546.2252, 1612.9) centre (-2908.8371, 1611.0167) ccw
  arc A6 (-1548.729, 1528.4291) -> (-639.1793, 561.975) centre (-639.1793, 1473.2) ccw
  line L8 (-639.1793, 561.975) -> (-511.2004, 561.975)
  line L9 (-1527.522, 1651) -> (-1546.5672, 1651)
  line L10 (-1546.5672, 1651) -> (-1546.5672, 1650.9746)
  line L11 (-1546.5672, 1650.9746) -> (-1527.522, 1650.9746)
  line L12 (-1527.522, 1650.9746) -> (-1527.522, 1651)
  dimension "d105" = 0.0254
extrude "Extrude18" cut sketch "Sketch20" against normal blind 0.0254 contours L2 L7 L9 L10 L11 L12
sketch "Sketch21" plane through (0, 0, 50.8) normal (0, 0, 1) x (-1, 0, 0)
  line L0 (-1527.522, 1650.9746) -> (-1527.522, 1645.7974)
  arc A0 (-1527.1752, 1612.9) -> (-1527.522, 1645.7974) centre (-2908.8371, 1614.7833) ccw
  arc A1 (-1529.714, 1527.2745) -> (-1527.1752, 1612.9) centre (-2908.8371, 1611.0167) ccw
  arc A2 (-1529.714, 1527.2745) -> (-639.1793, 581.025) centre (-639.1793, 1473.2) ccw
  line L1 (-639.1793, 581.025) -> (-511.2004, 581.025)
  line L2 (-511.2004, 581.025) -> (-511.2004, 561.975)
  line L3 (-511.2004, 561.975) -> (-639.1793, 561.975)
  arc A3 (-1548.729, 1528.4291) -> (-639.1793, 561.975) centre (-639.1793, 1473.2) ccw
  arc A4 (-1548.729, 1528.4291) -> (-1546.2252, 1612.9) centre (-2908.8371, 1611.0167) ccw
  arc A5 (-1546.2252, 1612.9) -> (-1546.5672, 1645.3698) centre (-2908.8371, 1614.7833) ccw
  line L4 (-1546.5672, 1645.3698) -> (-1546.5672, 1650.9746)
  line L5 (-1546.5672, 1650.9746) -> (-1527.522, 1650.9746)
  circle A6 centre (-1353.9986, 1358.9) radius 16
  circle A7 centre (-793.75, 765.9949) radius 16
  line L6 (-1295.8054, 1651) -> (-2198.0077, 1651)
  arc A8 (-2959.5333, 813.6871) -> (-2198.0077, 1651) centre (-2997.2, 1612.9) ccw
  line L7 (-2959.5333, 813.6871) -> (-2946.4, 813.6871)
  line L8 (-2946.4, 813.6871) -> (-2946.4, 0)
  line L9 (-2946.4, 0) -> (-511.175, 0)
  line L10 (-511.175, 0) -> (-511.175, 812.8)
  line L11 (-511.175, 812.8) -> (-639.1793, 812.8)
  arc A9 (-1298.3651, 1513.2267) -> (-639.1793, 812.8) centre (-639.1793, 1473.2) ccw
  arc A10 (-1298.3651, 1513.2267) -> (-1295.4, 1612.9) centre (-2908.8371, 1611.0167) ccw
  arc A11 (-1295.4, 1612.9) -> (-1295.8054, 1651) centre (-2908.8371, 1614.7833) ccw
  line L12 (-2946.3746, 250.825) -> (-511.2004, 250.825)
  line L13 (-511.2004, 250.825) -> (-511.2004, 231.775)
  line L14 (-511.2004, 231.775) -> (-2946.3746, 231.775)
  line L15 (-2946.3746, 231.775) -> (-2946.3746, 250.825)
  circle A12 centre (-2768.6, 63.5) radius 16
  circle A13 centre (-2171.7977, 1358.9) radius 16
  arc A14 (-2947.7252, 563.1402) -> (-1947.4672, 1662.944) centre (-2997.2, 1612.9) ccw
  arc A15 (-2948.622, 582.1691) -> (-1966.4956, 1662.0369) centre (-2997.2, 1612.9) ccw
  dimension "d108" = 250.825
  dimension "d109" = 231.775
extrude "Extrude19" add sketch "Sketch21" along normal blind 0.0279 contours L6 L8 A14 A15
sketch "Sketch22" plane through (0, 0, 50.8) normal (0, 0, 1) x (-1, 0, 0)
sketch "Sketch23" plane through (0, 0, 50.8) normal (0, 0, 1) x (-1, 0, 0)
  line L0 (-1527.522, 1650.9746) -> (-1527.522, 1645.7974)
  arc A0 (-1527.1752, 1612.9) -> (-1527.522, 1645.7974) centre (-2908.8371, 1614.7833) ccw
  arc A1 (-1529.714, 1527.2745) -> (-1527.1752, 1612.9) centre (-2908.8371, 1611.0167) ccw
  arc A2 (-1529.714, 1527.2745) -> (-639.1793, 581.025) centre (-639.1793, 1473.2) ccw
  line L1 (-639.1793, 581.025) -> (-511.2004, 581.025)
  line L2 (-511.2004, 581.025) -> (-511.2004, 561.975)
  line L3 (-511.2004, 561.975) -> (-639.1793, 561.975)
  arc A3 (-1548.729, 1528.4291) -> (-639.1793, 561.975) centre (-639.1793, 1473.2) ccw
  arc A4 (-1548.729, 1528.4291) -> (-1546.2252, 1612.9) centre (-2908.8371, 1611.0167) ccw
  arc A5 (-1546.2252, 1612.9) -> (-1546.5672, 1645.3698) centre (-2908.8371, 1614.7833) ccw
  line L4 (-1546.5672, 1645.3698) -> (-1546.5672, 1650.9746)
  line L5 (-1546.5672, 1650.9746) -> (-1527.522, 1650.9746)
  circle A6 centre (-1353.9986, 1358.9) radius 16
  circle A7 centre (-793.75, 765.9949) radius 16
  arc A8 (-2946.4, 563.2035) -> (-1946.9659, 1651) centre (-2997.2, 1612.9) ccw
  line L6 (-2946.4, 563.2035) -> (-2946.4, 0)
  line L7 (-2946.4, 0) -> (-511.175, 0)
  line L8 (-511.175, 0) -> (-511.175, 812.8)
  line L9 (-511.175, 812.8) -> (-639.1793, 812.8)
  arc A9 (-1298.3651, 1513.2267) -> (-639.1793, 812.8) centre (-639.1793, 1473.2) ccw
  arc A10 (-1298.3651, 1513.2267) -> (-1295.4, 1612.9) centre (-2908.8371, 1611.0167) ccw
  arc A11 (-1295.4, 1612.9) -> (-1295.8054, 1651) centre (-2908.8371, 1614.7833) ccw
  line L10 (-1295.8054, 1651) -> (-1946.9659, 1651)
  line L11 (-2946.3746, 250.825) -> (-511.2004, 250.825)
  line L12 (-511.2004, 250.825) -> (-511.2004, 231.775)
  line L13 (-511.2004, 231.775) -> (-2946.3746, 231.775)
  line L14 (-2946.3746, 231.775) -> (-2946.3746, 250.825)
  circle A12 centre (-2768.6, 63.5) radius 16
sketch "Sketch24" plane through (0, 0, 50.8) normal (0, 0, 1) x (-1, 0, 0)
  line L0 (-2997.2, 812.8) -> (-2997.2, 581.025)
  line L1 (-2997.2, 812.8) -> (-2997.2, 561.975)
  line L2 (-2997.2, 561.975) -> (-2974.975, 561.975)
  line L3 (-2974.975, 561.975) -> (-2974.975, 581.025)
  line L4 (-2974.975, 581.025) -> (-2997.2, 581.025)
  line L5 (-2997.2, 581.025) -> (-2997.2, 561.975)
  line L6 (-2974.975, 0) -> (-2974.975, 813.1087)
  point P0 (-2997.2, 812.8)
  dimension "d112" = 231.775
  dimension "d113" = 250.825
extrude "Extrude20" add sketch "Sketch24" along normal blind 0.0279
extrude "Extrude21" cut sketch "Sketch24" along normal blind 0.0279
extrude "Extrude22" add sketch "Sketch24" along normal blind 0.0279
sketch "Sketch25" plane through (0, 0, 50.8) normal (0, 0, 1) x (-1, 0, 0)
  line L0 (-2198.0077, 1679.575) -> (-1296.7004, 1679.575)
  arc A0 (-1296.7004, 1679.575) -> (-2997.2, 3225.8) centre (-2908.8371, 1614.7833) ccw
  line L1 (-2997.2, 3225.8) -> (-2997.2, 2413)
  arc A1 (-2198.0077, 1651) -> (-2997.2, 2413) centre (-2997.2, 1612.9) ccw
  line L2 (-2198.0077, 1651) -> (-2198.0077, 1679.575)
  arc A2 (-1966.4956, 1662.0369) -> (-2997.2, 2644.775) centre (-2997.2, 1612.9) ccw
  arc A3 (-1947.4672, 1662.944) -> (-2997.2, 2663.825) centre (-2997.2, 1612.9) ccw
  dimension "d121" = 250.825
extrude "Extrude23" add sketch "Sketch25" along normal blind 0.0279 contours L0 L1 A2 A3
sketch "Sketch28" plane through (0, 0, 50.8) normal (0, 0, 1) x (-1, 0, 0)
  arc A0 (-1948.3922, 1679.575) -> (-2997.2, 2663.825) centre (-2997.2, 1612.9) ccw
  line L0 (-1948.3922, 1679.575) -> (-1296.7004, 1679.575)
  arc A1 (-1296.7004, 1679.575) -> (-2997.2, 3225.8) centre (-2908.8371, 1614.7833) ccw
  line L1 (-2997.2, 3225.8) -> (-2997.2, 2663.825)
  arc A2 (-1547.323, 1669.5025) -> (-2983.4631, 2975.3514) centre (-2908.8371, 1614.7833) ccw
  arc A3 (-1528.2884, 1670.2675) -> (-2984.5064, 2994.3729) centre (-2908.8371, 1614.7833) ccw
  line L2 (-2983.4631, 2975.3514) -> (-2997.2, 2974.598)
  line L3 (-2984.5064, 2994.3729) -> (-2997.2, 2993.6766)
  dimension "d125" = -231.775
extrude "Extrude24" add sketch "Sketch28" along normal blind 0.0279 contours L0 L1 A2 A3 L2 L3
equation "d18 = ( 26 * 2 ) * 1 in"
